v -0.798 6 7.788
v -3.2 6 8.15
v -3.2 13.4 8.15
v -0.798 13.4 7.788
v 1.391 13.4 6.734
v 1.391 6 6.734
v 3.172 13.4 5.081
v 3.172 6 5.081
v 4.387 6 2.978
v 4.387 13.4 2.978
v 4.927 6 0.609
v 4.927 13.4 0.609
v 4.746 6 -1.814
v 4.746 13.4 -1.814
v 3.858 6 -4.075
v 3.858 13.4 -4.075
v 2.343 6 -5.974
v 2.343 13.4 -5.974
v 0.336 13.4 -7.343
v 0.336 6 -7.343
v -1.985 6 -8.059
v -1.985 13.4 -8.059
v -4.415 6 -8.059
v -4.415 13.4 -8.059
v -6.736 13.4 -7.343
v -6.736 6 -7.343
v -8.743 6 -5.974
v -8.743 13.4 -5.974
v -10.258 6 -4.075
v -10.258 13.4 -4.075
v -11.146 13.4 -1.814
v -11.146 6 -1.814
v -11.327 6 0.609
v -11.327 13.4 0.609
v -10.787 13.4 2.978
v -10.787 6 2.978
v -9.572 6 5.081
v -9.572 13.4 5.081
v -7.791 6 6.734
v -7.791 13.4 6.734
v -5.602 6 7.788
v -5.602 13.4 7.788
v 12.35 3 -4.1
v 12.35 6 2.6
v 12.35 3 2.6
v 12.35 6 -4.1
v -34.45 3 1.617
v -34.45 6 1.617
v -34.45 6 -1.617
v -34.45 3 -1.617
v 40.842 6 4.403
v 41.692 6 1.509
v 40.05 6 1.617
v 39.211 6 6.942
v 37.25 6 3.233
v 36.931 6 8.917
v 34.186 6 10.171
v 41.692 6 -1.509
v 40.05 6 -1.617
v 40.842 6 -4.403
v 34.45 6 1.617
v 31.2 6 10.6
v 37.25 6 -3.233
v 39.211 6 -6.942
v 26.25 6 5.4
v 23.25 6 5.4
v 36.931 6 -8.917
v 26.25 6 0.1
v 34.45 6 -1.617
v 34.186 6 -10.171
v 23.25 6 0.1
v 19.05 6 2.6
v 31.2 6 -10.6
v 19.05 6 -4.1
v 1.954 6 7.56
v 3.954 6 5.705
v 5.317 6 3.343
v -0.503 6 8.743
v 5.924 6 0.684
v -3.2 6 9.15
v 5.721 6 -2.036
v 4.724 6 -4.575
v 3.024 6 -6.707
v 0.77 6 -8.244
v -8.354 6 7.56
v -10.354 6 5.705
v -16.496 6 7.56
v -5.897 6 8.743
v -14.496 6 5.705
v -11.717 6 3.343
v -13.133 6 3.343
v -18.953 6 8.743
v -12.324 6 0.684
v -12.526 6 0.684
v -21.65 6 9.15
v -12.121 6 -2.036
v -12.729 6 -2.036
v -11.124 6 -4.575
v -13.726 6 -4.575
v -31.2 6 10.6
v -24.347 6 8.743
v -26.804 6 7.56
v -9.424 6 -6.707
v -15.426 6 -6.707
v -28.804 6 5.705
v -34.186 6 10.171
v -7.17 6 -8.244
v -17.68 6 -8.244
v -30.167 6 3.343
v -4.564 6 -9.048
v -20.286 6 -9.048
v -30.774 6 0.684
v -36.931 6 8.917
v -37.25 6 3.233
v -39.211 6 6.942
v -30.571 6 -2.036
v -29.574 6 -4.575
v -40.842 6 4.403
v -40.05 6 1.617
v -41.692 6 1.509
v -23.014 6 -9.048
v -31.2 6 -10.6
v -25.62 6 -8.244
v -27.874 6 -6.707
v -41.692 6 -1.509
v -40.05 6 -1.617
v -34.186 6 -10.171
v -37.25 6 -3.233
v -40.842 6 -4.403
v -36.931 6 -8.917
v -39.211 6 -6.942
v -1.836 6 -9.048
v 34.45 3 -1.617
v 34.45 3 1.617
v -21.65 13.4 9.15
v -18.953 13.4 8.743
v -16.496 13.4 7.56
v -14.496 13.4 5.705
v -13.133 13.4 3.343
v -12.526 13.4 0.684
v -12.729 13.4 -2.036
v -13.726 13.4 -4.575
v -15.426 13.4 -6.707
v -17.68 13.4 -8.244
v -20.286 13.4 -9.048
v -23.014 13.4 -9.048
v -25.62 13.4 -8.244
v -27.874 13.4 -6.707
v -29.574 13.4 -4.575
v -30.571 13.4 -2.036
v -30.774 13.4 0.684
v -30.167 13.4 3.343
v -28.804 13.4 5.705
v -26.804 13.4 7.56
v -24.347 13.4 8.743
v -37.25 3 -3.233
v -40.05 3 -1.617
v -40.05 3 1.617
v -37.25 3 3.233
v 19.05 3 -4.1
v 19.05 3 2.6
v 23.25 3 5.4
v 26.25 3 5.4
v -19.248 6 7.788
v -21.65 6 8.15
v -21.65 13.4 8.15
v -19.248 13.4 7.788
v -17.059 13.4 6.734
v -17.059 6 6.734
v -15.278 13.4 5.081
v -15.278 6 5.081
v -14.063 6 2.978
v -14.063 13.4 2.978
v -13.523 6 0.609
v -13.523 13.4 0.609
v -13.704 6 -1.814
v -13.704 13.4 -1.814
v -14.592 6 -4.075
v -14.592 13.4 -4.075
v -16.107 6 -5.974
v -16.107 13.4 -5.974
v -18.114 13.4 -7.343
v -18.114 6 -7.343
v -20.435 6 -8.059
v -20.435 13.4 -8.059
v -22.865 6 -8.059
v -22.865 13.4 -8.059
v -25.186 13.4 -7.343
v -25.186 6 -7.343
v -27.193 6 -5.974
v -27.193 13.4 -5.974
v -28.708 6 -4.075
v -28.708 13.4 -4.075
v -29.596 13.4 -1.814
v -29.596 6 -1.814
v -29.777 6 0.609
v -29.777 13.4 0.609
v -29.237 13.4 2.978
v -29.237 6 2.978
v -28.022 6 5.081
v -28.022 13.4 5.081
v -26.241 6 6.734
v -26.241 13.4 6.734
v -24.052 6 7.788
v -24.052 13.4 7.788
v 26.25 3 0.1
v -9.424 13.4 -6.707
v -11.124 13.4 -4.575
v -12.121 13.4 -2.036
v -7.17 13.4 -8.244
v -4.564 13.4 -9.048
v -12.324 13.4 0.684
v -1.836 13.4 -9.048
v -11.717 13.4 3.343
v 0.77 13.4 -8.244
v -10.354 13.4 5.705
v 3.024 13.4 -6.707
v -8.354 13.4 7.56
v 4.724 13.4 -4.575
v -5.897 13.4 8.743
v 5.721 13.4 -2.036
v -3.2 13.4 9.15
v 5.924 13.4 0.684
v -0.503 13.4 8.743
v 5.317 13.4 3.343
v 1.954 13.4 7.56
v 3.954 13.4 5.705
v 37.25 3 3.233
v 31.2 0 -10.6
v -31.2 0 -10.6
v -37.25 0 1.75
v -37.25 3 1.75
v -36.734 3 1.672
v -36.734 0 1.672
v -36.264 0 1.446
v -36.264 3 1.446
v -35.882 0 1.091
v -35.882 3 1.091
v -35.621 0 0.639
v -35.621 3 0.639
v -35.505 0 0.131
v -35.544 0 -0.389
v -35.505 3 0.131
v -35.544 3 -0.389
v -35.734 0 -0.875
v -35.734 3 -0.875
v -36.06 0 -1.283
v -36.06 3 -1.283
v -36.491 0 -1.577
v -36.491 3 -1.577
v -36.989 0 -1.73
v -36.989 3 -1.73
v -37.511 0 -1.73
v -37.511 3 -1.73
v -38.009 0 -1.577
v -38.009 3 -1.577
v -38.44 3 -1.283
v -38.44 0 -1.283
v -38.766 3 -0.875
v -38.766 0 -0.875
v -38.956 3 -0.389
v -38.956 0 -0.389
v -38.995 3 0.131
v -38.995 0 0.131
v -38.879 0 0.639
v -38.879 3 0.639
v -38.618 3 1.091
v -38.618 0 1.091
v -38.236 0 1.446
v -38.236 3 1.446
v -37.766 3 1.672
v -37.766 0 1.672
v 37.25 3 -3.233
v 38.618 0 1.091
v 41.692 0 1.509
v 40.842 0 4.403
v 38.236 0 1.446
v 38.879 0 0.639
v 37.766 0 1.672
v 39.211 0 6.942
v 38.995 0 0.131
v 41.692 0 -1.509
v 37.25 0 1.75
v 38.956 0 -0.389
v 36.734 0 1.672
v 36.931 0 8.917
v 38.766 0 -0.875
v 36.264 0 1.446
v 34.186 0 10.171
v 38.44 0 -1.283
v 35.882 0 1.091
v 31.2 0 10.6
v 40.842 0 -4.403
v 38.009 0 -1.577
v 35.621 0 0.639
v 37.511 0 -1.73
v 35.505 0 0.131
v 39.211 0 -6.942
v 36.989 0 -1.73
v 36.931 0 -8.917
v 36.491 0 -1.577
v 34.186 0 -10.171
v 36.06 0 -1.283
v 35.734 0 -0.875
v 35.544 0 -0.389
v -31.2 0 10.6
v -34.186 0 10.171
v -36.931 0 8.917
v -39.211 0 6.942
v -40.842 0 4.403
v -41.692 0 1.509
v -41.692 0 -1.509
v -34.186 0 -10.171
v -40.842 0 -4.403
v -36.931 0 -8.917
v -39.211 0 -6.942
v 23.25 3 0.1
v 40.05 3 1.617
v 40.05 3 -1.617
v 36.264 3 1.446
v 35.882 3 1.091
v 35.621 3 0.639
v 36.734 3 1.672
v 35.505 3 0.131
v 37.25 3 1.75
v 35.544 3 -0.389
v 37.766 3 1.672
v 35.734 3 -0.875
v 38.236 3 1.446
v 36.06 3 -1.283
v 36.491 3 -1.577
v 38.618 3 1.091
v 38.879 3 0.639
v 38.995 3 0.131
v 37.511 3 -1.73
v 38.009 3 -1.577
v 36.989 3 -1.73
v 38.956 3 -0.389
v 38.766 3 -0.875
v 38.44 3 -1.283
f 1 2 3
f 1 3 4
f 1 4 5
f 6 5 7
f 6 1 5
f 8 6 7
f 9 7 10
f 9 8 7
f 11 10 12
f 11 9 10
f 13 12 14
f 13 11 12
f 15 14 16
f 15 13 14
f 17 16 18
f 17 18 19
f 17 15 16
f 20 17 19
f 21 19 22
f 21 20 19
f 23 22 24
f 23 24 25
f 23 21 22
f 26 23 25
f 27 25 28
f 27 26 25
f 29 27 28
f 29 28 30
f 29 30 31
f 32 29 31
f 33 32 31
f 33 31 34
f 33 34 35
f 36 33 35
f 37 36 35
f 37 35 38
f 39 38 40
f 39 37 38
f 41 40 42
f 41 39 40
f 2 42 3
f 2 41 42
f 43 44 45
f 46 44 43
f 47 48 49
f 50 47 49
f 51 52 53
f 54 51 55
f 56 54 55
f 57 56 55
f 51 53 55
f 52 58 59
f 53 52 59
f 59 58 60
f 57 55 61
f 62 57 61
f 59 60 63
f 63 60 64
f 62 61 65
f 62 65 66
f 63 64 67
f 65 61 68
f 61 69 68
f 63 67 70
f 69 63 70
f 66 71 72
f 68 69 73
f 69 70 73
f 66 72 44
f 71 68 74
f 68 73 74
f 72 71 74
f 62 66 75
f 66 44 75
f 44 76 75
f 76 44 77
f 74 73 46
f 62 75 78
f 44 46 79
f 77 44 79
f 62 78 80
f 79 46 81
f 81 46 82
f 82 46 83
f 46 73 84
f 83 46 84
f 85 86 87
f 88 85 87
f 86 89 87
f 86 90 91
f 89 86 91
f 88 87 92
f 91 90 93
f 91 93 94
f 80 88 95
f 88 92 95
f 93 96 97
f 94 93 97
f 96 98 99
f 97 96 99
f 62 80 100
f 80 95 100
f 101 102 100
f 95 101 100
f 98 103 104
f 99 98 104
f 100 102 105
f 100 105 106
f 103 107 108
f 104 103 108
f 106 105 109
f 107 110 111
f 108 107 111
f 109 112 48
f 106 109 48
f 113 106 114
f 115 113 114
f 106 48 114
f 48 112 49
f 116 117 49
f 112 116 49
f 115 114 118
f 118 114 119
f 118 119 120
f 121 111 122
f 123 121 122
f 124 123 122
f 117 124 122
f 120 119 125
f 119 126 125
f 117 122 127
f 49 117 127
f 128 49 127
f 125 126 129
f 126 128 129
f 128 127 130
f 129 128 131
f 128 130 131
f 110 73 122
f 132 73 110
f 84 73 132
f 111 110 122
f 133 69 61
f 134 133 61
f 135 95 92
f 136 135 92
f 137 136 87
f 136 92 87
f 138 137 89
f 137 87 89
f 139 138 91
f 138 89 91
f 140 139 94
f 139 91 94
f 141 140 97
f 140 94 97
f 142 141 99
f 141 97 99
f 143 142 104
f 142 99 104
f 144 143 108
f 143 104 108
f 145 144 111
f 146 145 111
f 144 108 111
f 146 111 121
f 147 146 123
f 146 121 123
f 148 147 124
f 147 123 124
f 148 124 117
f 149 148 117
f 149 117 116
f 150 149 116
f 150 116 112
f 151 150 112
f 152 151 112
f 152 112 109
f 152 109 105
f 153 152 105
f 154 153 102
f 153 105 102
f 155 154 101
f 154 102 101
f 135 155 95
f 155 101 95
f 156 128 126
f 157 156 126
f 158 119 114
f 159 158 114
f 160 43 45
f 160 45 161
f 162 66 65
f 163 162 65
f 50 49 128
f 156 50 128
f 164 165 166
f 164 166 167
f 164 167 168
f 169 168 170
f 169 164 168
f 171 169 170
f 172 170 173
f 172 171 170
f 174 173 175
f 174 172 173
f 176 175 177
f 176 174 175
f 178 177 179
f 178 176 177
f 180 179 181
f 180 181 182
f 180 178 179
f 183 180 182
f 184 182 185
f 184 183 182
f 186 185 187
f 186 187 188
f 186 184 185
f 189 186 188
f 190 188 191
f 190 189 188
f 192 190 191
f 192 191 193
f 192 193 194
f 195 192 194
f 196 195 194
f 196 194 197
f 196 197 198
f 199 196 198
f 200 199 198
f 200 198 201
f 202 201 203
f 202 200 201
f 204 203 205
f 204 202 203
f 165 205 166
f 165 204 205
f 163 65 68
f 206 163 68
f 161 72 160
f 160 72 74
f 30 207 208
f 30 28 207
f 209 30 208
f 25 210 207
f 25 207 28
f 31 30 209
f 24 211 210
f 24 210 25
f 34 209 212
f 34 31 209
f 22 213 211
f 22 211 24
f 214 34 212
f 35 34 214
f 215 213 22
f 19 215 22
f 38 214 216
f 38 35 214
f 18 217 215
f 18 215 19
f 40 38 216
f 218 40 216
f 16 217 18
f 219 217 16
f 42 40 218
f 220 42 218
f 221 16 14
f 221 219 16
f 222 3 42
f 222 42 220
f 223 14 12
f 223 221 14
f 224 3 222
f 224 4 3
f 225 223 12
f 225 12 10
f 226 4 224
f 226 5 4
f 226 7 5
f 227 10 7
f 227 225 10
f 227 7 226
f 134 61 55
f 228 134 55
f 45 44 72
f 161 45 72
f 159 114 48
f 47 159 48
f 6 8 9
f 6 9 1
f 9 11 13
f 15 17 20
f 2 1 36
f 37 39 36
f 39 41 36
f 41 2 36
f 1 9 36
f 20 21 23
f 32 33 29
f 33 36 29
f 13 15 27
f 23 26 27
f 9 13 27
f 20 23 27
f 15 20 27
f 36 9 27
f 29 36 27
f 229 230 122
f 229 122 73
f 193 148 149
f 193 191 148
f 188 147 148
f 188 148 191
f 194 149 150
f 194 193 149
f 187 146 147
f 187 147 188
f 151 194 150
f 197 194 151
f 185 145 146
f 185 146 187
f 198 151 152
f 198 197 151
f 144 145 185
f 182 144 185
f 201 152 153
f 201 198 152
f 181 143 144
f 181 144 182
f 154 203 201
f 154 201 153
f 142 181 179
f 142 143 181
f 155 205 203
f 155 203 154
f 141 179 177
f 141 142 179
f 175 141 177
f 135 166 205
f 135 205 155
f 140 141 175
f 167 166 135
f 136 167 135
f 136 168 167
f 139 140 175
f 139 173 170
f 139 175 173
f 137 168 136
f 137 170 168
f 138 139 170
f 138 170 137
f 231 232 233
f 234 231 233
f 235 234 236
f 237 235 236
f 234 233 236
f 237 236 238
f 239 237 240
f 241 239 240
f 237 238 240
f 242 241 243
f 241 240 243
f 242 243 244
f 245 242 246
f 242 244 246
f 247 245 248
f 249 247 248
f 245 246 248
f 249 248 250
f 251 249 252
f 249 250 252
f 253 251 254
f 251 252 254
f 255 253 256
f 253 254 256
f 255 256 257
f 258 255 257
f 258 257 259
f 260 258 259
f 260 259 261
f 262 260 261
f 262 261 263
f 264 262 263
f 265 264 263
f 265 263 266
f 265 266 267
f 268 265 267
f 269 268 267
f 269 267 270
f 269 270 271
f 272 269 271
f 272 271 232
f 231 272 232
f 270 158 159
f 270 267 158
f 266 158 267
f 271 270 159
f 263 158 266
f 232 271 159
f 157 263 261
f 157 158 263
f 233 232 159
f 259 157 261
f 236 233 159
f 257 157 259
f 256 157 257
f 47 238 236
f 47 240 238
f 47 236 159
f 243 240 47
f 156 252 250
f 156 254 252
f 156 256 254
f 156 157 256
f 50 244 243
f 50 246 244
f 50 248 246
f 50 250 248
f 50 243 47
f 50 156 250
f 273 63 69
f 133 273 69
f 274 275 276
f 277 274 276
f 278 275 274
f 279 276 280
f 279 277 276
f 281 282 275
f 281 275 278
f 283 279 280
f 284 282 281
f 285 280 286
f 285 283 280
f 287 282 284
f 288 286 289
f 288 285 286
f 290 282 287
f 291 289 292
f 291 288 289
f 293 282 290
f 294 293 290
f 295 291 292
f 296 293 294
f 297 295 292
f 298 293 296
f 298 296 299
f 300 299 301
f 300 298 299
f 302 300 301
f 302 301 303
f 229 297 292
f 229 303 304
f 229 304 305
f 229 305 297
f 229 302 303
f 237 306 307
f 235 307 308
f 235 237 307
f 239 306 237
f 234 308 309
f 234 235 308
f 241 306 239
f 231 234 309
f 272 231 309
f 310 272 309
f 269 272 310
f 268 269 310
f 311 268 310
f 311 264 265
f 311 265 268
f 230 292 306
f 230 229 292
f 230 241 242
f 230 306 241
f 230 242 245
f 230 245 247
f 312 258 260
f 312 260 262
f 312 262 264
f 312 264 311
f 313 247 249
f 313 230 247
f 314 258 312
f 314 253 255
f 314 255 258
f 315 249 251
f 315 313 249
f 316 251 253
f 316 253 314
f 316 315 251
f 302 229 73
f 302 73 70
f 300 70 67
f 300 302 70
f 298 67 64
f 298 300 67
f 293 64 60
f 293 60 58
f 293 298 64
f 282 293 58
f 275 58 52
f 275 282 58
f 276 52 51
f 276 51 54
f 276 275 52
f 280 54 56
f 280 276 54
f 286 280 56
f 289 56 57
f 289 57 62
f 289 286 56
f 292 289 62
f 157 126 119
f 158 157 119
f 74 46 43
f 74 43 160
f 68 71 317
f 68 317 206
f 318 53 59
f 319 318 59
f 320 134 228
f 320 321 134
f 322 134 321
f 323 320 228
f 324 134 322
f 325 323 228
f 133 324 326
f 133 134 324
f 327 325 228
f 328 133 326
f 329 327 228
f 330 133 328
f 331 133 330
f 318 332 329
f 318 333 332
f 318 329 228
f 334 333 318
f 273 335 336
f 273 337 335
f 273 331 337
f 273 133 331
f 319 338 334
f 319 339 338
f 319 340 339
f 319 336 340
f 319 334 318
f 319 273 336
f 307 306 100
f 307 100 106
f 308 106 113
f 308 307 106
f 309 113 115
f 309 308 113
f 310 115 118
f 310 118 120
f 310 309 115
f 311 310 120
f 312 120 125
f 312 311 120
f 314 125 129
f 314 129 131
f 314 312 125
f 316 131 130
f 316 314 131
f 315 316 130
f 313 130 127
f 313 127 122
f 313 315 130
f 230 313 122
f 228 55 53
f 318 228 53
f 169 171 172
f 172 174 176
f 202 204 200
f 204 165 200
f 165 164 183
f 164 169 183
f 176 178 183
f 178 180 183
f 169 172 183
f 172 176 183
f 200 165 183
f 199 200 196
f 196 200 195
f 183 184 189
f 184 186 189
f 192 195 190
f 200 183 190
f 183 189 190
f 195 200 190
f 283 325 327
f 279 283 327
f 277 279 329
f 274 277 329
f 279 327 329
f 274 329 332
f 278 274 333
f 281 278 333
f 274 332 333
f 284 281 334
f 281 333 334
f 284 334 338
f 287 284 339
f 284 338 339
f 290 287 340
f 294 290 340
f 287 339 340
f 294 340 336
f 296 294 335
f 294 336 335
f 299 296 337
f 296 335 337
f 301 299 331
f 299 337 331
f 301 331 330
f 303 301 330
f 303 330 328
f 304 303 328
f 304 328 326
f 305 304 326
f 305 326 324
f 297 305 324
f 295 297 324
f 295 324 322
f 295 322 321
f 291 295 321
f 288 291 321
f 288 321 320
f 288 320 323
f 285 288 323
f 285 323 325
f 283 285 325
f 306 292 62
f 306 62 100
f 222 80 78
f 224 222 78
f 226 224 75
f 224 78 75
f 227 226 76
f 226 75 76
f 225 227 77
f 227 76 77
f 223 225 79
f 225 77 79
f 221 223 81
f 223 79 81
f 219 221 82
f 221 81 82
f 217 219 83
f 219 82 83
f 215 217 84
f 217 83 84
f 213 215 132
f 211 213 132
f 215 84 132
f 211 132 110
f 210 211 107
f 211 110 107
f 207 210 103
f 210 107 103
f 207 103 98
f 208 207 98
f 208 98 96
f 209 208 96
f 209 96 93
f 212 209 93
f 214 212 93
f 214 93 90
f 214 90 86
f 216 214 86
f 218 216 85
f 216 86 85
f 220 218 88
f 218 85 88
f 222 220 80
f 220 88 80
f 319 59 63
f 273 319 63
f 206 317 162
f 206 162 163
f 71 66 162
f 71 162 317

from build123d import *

# Parameters (mm, degrees)
BOSS_EXTRUDE1_DEPTH = 6
SKETCH2_R           = 9.15
SKETCH2_R_2         = 8.15
BOSS_EXTRUDE2_DEPTH = 7.4
CUT_EXTRUDE1_DEPTH  = 3
SKETCH4_R           = 1.75
CUT_EXTRUDE2_DEPTH  = 45.359440934
SKETCH5_W           = 3
SKETCH5_H           = 5.3
SKETCH5_W_2         = 6.7
SKETCH5_H_2         = 6.7
CUT_EXTRUDE3_DEPTH  = 3


with BuildPart() as part:
    # Sketch1 → Boss-Extrude1 (new body)
    with BuildSketch(Plane(origin=(0, 0, 0), x_dir=(1, 0, 0), z_dir=(0, 1, 0))):
        with BuildLine():
            Line((-31.2, 10.6), (31.2, 10.6))
            ThreePointArc((31.2, 10.6), (41.8, 0), (31.2, -10.6))
            Line((31.2, -10.6), (-31.2, -10.6))
            ThreePointArc((-31.2, -10.6), (-41.8, 0), (-31.2, 10.6))
        make_face()
    extrude(amount=BOSS_EXTRUDE1_DEPTH)

    # Sketch2 → Boss-Extrude2 (add)
    # profile 1 of 2: a face of its own
    with BuildSketch(Plane(origin=(0, 6, 0), x_dir=(1, 0, 0), z_dir=(0, 1, 0))):
        with Locations(Location((-21.65, 0, 0), (0, 0, 270))):
            Circle(SKETCH2_R)
        with Locations(Location((-21.65, 0, 0), (0, 0, 270))):
            Circle(SKETCH2_R_2, mode=Mode.SUBTRACT)
    # profile 2 of 2: a face of its own
    with BuildSketch(Plane(origin=(0, 6, 0), x_dir=(1, 0, 0), z_dir=(0, 1, 0))):
        with Locations(Location((-3.2, 0, 0), (0, 0, 270))):
            Circle(SKETCH2_R)
        with Locations(Location((-3.2, 0, 0), (0, 0, 270))):
            Circle(SKETCH2_R_2, mode=Mode.SUBTRACT)
    extrude(amount=BOSS_EXTRUDE2_DEPTH)

    # Sketch3 → Cut-Extrude1 (cut)
    with BuildSketch(Plane(origin=(0, 6, 0), x_dir=(1, 0, 0), z_dir=(0, 1, 0))):
        Polygon((-37.25, -3.233161507), (-34.45, -1.616580754), (-34.45, 1.616580754), (-37.25, 3.233161507), (-40.05, 1.616580754), (-40.05, -1.616580754), align=None)
        Polygon((37.25, -3.233161507), (40.05, -1.616580754), (40.05, 1.616580754), (37.25, 3.233161507), (34.45, 1.616580754), (34.45, -1.616580754), align=None)
    extrude(amount=-CUT_EXTRUDE1_DEPTH, mode=Mode.SUBTRACT)

    # Sketch4 → Cut-Extrude2 (cut, through all)
    with BuildSketch(Plane(origin=(0, 3, 0), x_dir=(1, 0, 0), z_dir=(0, 1, 0))):
        with Locations(Location((-37.25, 0, 0), (0, 0, 270))):
            Circle(SKETCH4_R)
        with Locations(Location((37.25, 0, 0), (0, 0, 270))):
            Circle(SKETCH4_R)
    extrude(amount=-CUT_EXTRUDE2_DEPTH, mode=Mode.SUBTRACT)

    # Sketch5 → Cut-Extrude3 (cut)
    with BuildSketch(Plane(origin=(0, 6, 0), x_dir=(1, 0, 0), z_dir=(0, 1, 0))):
        with Locations((24.75, -2.75)):
            Rectangle(SKETCH5_W, SKETCH5_H)
        with Locations((15.7, 0.75)):
            Rectangle(SKETCH5_W_2, SKETCH5_H_2)
    extrude(amount=-CUT_EXTRUDE3_DEPTH, mode=Mode.SUBTRACT)


solid = part.part
